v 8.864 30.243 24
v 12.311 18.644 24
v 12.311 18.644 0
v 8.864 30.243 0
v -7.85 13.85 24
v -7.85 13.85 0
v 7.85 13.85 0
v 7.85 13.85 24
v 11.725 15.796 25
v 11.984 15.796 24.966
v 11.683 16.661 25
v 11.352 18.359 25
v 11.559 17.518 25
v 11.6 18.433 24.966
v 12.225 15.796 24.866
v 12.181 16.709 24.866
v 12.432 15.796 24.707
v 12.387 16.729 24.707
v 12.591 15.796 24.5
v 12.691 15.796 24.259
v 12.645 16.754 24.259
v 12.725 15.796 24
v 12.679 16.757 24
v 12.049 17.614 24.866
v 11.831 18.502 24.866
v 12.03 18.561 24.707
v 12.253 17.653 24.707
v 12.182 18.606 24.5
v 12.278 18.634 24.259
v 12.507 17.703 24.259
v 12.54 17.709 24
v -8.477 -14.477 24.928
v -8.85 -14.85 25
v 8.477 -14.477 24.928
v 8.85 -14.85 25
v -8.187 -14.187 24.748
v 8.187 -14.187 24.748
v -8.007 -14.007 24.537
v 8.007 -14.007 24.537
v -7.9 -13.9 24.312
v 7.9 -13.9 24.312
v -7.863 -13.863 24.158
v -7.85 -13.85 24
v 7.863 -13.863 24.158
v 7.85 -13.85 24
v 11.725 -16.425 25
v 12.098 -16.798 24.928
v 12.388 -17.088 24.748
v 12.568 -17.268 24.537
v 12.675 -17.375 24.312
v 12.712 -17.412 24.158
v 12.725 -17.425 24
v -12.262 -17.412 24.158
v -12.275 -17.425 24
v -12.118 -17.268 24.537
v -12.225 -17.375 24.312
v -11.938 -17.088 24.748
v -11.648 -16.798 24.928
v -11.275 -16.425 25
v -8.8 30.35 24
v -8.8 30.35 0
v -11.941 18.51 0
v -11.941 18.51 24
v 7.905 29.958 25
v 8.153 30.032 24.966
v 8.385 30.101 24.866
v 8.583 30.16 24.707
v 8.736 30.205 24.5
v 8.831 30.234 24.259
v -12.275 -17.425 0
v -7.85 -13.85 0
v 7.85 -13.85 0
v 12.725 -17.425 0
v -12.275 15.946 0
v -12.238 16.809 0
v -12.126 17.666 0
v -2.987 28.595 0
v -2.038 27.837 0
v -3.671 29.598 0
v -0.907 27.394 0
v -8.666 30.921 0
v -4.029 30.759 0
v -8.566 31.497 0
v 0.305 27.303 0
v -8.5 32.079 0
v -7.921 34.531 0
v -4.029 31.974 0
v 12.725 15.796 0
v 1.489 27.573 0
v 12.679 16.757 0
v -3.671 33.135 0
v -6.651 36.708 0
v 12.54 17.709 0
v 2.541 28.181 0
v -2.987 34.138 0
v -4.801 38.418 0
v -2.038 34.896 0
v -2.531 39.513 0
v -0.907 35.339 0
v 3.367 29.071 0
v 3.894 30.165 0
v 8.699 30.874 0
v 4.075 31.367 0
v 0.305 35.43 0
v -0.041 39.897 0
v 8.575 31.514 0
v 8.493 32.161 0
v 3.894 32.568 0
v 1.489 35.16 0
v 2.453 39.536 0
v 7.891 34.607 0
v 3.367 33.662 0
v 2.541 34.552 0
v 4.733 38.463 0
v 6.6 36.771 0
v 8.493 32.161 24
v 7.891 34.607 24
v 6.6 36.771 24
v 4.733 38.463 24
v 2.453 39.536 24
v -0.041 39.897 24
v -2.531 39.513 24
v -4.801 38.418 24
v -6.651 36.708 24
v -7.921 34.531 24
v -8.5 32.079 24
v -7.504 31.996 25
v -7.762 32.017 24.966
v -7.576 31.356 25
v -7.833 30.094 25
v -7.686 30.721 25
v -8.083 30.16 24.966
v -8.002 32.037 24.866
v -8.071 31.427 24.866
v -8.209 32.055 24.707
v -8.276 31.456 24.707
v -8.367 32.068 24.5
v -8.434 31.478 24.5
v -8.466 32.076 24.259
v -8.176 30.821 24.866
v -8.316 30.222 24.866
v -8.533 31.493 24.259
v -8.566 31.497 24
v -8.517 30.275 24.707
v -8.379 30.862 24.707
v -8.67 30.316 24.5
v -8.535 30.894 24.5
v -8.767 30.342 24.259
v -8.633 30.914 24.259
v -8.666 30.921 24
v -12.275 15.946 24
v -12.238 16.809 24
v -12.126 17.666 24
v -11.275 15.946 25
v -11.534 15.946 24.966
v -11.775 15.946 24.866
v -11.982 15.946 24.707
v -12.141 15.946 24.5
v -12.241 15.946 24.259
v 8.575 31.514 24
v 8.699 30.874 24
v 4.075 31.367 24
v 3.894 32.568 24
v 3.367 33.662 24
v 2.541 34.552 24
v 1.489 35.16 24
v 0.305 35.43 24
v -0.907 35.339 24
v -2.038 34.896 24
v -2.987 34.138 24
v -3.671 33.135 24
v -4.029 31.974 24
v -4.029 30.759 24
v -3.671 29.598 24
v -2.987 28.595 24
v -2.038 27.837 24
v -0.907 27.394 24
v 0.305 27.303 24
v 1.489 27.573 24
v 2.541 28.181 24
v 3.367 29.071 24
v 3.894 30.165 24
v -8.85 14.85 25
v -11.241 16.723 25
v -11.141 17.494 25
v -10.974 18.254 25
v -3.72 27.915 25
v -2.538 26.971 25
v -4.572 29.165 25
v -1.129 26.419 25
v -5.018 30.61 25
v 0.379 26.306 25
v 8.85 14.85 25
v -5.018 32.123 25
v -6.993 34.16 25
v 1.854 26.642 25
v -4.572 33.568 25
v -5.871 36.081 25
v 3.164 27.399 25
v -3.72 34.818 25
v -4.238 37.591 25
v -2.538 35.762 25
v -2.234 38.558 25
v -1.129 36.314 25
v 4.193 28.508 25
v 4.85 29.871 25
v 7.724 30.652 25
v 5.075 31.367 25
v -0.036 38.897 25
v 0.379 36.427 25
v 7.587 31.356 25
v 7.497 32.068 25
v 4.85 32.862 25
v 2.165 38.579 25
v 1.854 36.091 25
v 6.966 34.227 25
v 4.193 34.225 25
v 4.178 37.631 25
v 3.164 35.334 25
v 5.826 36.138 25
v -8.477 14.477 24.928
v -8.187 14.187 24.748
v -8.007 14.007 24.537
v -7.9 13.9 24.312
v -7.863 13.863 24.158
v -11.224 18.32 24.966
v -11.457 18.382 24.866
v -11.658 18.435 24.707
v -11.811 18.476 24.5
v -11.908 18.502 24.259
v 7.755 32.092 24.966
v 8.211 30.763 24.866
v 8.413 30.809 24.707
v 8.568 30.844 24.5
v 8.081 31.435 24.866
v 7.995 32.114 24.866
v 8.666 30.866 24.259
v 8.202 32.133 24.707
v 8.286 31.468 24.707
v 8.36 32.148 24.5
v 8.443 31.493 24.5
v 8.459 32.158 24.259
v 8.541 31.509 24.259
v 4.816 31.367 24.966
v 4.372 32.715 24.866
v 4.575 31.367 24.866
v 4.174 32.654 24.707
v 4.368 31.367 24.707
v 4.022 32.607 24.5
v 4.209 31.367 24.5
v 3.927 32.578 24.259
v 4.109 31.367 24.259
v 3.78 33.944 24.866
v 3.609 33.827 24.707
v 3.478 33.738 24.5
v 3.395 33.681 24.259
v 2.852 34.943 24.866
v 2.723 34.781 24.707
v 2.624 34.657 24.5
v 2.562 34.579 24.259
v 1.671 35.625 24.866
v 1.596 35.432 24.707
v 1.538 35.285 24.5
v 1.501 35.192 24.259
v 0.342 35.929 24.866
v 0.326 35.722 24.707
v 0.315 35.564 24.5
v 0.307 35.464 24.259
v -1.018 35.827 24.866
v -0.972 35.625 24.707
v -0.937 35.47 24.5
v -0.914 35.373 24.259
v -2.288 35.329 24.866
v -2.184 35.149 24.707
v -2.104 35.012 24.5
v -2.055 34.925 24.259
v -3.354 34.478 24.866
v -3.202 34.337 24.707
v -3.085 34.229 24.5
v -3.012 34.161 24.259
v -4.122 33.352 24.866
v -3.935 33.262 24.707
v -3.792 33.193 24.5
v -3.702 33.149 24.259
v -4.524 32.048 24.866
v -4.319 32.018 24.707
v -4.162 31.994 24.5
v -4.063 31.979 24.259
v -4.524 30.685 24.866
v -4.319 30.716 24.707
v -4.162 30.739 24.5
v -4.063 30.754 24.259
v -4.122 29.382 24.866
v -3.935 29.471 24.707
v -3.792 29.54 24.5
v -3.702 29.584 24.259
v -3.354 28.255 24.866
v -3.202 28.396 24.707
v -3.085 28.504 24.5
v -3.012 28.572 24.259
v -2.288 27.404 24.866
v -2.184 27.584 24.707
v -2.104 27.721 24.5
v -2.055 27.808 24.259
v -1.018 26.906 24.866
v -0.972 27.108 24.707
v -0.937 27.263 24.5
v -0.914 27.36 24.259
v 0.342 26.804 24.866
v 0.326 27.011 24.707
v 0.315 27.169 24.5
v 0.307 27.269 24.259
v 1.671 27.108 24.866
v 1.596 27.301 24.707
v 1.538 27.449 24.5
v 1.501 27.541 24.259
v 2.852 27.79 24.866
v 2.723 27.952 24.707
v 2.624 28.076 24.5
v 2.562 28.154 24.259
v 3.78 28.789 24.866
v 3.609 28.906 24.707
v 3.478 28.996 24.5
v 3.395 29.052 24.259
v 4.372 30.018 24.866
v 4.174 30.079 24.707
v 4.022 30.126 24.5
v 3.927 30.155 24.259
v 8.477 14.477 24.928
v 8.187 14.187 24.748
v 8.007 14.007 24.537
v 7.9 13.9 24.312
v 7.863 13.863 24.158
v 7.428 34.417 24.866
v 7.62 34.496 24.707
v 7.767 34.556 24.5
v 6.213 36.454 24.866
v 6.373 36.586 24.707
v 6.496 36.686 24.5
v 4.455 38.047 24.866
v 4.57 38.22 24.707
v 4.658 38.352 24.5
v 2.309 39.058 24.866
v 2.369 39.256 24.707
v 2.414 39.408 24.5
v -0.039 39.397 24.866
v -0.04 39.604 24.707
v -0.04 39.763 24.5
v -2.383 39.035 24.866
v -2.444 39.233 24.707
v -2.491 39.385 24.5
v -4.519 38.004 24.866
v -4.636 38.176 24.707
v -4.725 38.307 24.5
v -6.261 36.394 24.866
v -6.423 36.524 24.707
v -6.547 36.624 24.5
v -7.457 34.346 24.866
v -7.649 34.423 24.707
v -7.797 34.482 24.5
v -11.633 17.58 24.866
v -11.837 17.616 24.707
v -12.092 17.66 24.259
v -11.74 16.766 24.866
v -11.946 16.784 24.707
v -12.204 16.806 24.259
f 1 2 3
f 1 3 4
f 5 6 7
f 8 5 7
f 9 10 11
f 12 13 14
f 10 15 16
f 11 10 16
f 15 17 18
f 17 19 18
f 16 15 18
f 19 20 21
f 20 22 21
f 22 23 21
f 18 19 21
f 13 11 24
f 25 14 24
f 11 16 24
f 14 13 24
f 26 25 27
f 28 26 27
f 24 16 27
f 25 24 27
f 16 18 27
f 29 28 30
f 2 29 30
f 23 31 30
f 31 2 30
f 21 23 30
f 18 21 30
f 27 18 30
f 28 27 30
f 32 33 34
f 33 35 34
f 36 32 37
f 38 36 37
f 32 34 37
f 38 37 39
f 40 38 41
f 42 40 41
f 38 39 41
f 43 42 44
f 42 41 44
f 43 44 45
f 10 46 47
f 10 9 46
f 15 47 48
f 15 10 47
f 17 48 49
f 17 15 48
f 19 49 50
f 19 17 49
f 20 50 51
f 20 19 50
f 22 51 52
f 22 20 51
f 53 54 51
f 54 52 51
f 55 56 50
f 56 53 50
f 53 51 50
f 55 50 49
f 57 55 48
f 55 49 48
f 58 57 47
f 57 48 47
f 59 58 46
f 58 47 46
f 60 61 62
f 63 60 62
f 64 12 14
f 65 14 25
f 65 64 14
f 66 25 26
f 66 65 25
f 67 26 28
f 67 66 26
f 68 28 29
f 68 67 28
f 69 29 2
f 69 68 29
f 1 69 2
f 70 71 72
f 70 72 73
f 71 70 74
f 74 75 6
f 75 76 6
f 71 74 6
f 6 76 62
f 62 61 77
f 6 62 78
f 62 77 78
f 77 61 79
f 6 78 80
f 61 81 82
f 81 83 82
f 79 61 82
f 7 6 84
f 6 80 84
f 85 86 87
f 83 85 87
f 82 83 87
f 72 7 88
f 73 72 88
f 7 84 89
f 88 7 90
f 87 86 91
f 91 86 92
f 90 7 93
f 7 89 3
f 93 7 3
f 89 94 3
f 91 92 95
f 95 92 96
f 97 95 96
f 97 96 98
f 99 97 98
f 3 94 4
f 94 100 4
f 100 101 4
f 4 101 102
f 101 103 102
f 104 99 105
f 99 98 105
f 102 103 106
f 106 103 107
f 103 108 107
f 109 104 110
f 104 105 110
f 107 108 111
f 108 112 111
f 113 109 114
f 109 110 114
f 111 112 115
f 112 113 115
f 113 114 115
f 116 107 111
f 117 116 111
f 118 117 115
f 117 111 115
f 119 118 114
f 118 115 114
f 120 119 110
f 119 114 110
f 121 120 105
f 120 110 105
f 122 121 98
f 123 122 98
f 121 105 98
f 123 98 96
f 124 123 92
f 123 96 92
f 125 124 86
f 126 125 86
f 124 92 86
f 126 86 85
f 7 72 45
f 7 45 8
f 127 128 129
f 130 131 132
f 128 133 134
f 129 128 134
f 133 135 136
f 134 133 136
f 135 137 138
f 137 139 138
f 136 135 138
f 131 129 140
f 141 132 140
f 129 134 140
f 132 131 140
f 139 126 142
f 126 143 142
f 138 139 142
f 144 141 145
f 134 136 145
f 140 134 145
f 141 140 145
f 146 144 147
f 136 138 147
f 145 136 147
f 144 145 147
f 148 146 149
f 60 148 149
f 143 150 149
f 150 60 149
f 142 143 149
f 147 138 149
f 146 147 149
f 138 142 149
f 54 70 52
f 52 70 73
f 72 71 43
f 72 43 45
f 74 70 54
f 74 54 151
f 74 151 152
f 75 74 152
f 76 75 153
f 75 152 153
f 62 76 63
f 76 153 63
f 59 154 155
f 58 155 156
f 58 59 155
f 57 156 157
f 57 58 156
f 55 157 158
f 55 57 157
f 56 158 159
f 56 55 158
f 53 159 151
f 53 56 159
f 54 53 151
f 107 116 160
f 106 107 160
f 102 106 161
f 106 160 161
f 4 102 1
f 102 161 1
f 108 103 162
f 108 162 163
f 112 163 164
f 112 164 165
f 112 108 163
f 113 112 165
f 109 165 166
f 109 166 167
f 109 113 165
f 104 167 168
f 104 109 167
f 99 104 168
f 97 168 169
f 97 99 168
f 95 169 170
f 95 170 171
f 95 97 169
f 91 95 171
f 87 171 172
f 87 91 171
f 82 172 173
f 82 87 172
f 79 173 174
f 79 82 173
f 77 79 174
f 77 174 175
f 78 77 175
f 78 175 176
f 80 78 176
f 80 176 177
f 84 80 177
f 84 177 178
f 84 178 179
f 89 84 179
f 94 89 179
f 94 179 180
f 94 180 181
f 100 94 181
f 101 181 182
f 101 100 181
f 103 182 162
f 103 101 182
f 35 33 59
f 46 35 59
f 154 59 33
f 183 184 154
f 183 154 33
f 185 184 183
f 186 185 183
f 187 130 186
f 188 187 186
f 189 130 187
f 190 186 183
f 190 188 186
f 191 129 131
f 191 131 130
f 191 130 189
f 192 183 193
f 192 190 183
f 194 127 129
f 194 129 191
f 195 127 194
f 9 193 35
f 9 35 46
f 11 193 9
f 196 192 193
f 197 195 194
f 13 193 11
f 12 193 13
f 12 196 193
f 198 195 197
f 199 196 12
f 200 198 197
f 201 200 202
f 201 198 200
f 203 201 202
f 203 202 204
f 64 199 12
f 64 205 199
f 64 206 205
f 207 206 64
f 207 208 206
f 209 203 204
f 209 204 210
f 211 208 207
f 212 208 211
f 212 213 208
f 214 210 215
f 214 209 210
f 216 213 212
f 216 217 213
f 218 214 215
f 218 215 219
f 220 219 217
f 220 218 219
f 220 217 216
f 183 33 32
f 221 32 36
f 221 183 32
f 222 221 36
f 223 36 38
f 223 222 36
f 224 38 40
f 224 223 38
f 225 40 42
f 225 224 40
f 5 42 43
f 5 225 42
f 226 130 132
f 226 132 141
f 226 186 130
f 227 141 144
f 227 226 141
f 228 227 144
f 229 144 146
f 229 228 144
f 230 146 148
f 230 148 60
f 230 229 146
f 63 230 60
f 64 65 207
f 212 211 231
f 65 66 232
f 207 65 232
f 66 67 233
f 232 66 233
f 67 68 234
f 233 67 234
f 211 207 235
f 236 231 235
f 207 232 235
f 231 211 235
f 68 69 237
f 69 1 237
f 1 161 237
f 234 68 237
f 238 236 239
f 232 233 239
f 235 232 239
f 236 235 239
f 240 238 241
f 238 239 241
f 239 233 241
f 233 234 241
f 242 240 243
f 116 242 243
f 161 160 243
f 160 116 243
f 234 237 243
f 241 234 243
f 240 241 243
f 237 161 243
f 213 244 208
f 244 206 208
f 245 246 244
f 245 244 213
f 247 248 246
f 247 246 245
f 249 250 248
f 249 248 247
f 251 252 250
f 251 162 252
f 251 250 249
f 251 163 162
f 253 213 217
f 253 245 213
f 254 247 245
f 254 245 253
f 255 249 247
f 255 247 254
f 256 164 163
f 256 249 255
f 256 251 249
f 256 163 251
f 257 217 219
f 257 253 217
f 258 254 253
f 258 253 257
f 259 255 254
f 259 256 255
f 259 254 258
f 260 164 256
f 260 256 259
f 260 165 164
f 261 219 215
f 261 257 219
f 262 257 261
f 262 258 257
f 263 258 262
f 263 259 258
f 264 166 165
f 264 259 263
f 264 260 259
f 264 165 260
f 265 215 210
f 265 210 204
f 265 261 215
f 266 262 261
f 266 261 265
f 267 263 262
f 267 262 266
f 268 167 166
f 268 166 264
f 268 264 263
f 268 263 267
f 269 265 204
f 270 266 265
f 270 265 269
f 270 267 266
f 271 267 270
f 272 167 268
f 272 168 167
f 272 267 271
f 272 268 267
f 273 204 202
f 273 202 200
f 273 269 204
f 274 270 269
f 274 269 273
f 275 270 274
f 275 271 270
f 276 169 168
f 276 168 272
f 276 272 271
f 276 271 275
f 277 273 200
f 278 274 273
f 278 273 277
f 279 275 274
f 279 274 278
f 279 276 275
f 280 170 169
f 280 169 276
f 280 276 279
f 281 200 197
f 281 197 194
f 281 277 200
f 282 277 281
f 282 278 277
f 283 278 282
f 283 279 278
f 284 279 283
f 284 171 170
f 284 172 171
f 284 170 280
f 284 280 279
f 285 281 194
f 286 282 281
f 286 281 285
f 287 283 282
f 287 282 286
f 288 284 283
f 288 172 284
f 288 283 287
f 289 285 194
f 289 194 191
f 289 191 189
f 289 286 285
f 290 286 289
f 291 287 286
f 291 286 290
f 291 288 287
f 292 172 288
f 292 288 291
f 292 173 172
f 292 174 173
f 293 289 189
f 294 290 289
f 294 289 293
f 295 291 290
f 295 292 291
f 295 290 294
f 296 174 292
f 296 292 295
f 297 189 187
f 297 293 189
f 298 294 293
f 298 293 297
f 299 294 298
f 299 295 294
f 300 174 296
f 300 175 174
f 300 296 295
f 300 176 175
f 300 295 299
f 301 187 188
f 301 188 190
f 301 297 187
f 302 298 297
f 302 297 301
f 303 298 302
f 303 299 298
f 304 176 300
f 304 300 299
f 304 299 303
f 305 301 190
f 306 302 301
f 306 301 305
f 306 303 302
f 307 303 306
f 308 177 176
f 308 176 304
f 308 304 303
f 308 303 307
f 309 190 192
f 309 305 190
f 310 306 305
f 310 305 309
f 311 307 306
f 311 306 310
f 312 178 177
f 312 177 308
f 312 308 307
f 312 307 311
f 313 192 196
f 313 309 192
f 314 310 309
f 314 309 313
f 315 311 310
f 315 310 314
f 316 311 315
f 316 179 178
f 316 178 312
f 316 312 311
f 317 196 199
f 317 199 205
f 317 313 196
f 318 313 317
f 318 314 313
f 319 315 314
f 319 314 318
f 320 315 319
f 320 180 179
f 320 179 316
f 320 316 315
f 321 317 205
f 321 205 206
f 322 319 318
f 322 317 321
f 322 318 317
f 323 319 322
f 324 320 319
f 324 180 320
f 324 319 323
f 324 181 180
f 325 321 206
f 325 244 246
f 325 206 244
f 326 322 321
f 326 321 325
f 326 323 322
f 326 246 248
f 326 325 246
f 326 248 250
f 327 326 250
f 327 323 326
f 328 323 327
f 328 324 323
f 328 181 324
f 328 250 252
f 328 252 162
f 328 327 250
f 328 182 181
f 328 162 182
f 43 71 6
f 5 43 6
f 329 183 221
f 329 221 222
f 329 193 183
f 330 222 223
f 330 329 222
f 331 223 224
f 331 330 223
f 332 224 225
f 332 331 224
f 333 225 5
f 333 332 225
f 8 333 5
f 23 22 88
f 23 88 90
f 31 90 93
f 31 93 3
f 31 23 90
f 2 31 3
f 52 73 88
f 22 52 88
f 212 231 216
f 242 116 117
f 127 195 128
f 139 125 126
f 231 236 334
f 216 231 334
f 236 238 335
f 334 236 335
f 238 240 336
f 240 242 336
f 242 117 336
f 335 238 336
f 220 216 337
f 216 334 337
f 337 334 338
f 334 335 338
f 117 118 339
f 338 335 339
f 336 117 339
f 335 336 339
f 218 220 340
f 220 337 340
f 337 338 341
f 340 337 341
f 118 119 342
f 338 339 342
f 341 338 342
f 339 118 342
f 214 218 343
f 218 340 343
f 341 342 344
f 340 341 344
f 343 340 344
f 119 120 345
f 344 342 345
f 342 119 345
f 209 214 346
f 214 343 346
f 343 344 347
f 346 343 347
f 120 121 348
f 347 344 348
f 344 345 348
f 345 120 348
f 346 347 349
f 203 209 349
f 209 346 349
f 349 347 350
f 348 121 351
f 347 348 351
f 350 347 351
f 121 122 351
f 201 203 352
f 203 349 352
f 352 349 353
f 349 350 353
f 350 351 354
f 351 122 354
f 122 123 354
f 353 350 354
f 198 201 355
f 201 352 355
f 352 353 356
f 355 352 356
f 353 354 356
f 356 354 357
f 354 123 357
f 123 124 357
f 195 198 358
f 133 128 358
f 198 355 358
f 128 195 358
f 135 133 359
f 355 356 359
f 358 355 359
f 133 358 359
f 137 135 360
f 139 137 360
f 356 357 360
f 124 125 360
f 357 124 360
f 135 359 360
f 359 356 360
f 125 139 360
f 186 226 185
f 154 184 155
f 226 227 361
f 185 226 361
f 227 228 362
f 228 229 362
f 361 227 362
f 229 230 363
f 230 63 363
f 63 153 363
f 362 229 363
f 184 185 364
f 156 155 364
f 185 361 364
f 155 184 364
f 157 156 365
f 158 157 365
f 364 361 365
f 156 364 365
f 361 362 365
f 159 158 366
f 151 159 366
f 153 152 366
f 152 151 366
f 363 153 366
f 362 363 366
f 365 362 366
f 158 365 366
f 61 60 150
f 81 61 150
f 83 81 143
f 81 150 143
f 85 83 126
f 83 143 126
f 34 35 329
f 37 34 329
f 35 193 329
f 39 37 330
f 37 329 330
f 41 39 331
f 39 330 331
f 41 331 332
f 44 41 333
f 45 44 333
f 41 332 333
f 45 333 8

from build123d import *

# Parameters (mm, degrees)
F0_W     = 25
F0_H     = 34.675
F0_W_2   = 15.7
F0_H_2   = 27.7
F0_R     = 4.075
F1_DEPTH = 25
F2_R     = 10
F3_R     = 1


with BuildPart() as f1:
    # F0 (on Top) → F1 (new body)
    with BuildSketch(Plane.XY):
        with Locations((0.225, -0.0875)):
            Rectangle(F0_W, F0_H)
        Rectangle(F0_W_2, F0_H_2, mode=Mode.SUBTRACT)
        with BuildLine():
            Line((-12.275, 17.25), (12.725, 17.25))
            Line((12.725, 17.25), (8.530193, 31.366524))
            ThreePointArc((8.530193, 31.366524), (0, 22.836331), (-8.530193, 31.366524))
            Line((-8.530193, 31.366524), (-12.275, 17.25))
        make_face()
        with BuildLine():
            ThreePointArc((-8.530193, 31.366524), (0, 22.836331), (8.530193, 31.366524))
            ThreePointArc((8.530193, 31.366524), (0, 39.896717), (-8.530193, 31.366524))
        make_face()
        with Locations((0, 31.366524)):
            Circle(F0_R, mode=Mode.SUBTRACT)
    extrude(amount=F1_DEPTH)

    # F2
    f2_edges = [f1.edges().sort_by_distance(p)[0] for p in [
        (12.725, 17.25, 12.5),
        (8.530193, 31.366524, 12.5),
        (-8.530193, 31.366524, 12.5),
        (-12.275, 17.25, 12.5),
    ]]
    fillet(f2_edges, radius=F2_R)

    # F3
    f3_edges = [f1.edges().sort_by_distance(p)[0] for p in [
        (12.725, -0.814676, 25),
        (12.620892, 17.234859, 25),
        (0.225, -17.425, 25),
        (10.587354, 24.443688, 25),
        (-12.275, -0.739421, 25),
        (8.631638, 31.192913, 25),
        (-12.191068, 17.239057, 25),
        (-0.040943, 39.896618, 25),
        (-10.370209, 24.430349, 25),
        (-8.612072, 31.208214, 25),
        (7.85, 0, 25),
        (0, -13.85, 25),
        (-7.85, 0, 25),
        (0, 13.85, 25),
        (-4.075, 31.366524, 25),
    ]]
    fillet(f3_edges, radius=F3_R)


solid = f1.part
